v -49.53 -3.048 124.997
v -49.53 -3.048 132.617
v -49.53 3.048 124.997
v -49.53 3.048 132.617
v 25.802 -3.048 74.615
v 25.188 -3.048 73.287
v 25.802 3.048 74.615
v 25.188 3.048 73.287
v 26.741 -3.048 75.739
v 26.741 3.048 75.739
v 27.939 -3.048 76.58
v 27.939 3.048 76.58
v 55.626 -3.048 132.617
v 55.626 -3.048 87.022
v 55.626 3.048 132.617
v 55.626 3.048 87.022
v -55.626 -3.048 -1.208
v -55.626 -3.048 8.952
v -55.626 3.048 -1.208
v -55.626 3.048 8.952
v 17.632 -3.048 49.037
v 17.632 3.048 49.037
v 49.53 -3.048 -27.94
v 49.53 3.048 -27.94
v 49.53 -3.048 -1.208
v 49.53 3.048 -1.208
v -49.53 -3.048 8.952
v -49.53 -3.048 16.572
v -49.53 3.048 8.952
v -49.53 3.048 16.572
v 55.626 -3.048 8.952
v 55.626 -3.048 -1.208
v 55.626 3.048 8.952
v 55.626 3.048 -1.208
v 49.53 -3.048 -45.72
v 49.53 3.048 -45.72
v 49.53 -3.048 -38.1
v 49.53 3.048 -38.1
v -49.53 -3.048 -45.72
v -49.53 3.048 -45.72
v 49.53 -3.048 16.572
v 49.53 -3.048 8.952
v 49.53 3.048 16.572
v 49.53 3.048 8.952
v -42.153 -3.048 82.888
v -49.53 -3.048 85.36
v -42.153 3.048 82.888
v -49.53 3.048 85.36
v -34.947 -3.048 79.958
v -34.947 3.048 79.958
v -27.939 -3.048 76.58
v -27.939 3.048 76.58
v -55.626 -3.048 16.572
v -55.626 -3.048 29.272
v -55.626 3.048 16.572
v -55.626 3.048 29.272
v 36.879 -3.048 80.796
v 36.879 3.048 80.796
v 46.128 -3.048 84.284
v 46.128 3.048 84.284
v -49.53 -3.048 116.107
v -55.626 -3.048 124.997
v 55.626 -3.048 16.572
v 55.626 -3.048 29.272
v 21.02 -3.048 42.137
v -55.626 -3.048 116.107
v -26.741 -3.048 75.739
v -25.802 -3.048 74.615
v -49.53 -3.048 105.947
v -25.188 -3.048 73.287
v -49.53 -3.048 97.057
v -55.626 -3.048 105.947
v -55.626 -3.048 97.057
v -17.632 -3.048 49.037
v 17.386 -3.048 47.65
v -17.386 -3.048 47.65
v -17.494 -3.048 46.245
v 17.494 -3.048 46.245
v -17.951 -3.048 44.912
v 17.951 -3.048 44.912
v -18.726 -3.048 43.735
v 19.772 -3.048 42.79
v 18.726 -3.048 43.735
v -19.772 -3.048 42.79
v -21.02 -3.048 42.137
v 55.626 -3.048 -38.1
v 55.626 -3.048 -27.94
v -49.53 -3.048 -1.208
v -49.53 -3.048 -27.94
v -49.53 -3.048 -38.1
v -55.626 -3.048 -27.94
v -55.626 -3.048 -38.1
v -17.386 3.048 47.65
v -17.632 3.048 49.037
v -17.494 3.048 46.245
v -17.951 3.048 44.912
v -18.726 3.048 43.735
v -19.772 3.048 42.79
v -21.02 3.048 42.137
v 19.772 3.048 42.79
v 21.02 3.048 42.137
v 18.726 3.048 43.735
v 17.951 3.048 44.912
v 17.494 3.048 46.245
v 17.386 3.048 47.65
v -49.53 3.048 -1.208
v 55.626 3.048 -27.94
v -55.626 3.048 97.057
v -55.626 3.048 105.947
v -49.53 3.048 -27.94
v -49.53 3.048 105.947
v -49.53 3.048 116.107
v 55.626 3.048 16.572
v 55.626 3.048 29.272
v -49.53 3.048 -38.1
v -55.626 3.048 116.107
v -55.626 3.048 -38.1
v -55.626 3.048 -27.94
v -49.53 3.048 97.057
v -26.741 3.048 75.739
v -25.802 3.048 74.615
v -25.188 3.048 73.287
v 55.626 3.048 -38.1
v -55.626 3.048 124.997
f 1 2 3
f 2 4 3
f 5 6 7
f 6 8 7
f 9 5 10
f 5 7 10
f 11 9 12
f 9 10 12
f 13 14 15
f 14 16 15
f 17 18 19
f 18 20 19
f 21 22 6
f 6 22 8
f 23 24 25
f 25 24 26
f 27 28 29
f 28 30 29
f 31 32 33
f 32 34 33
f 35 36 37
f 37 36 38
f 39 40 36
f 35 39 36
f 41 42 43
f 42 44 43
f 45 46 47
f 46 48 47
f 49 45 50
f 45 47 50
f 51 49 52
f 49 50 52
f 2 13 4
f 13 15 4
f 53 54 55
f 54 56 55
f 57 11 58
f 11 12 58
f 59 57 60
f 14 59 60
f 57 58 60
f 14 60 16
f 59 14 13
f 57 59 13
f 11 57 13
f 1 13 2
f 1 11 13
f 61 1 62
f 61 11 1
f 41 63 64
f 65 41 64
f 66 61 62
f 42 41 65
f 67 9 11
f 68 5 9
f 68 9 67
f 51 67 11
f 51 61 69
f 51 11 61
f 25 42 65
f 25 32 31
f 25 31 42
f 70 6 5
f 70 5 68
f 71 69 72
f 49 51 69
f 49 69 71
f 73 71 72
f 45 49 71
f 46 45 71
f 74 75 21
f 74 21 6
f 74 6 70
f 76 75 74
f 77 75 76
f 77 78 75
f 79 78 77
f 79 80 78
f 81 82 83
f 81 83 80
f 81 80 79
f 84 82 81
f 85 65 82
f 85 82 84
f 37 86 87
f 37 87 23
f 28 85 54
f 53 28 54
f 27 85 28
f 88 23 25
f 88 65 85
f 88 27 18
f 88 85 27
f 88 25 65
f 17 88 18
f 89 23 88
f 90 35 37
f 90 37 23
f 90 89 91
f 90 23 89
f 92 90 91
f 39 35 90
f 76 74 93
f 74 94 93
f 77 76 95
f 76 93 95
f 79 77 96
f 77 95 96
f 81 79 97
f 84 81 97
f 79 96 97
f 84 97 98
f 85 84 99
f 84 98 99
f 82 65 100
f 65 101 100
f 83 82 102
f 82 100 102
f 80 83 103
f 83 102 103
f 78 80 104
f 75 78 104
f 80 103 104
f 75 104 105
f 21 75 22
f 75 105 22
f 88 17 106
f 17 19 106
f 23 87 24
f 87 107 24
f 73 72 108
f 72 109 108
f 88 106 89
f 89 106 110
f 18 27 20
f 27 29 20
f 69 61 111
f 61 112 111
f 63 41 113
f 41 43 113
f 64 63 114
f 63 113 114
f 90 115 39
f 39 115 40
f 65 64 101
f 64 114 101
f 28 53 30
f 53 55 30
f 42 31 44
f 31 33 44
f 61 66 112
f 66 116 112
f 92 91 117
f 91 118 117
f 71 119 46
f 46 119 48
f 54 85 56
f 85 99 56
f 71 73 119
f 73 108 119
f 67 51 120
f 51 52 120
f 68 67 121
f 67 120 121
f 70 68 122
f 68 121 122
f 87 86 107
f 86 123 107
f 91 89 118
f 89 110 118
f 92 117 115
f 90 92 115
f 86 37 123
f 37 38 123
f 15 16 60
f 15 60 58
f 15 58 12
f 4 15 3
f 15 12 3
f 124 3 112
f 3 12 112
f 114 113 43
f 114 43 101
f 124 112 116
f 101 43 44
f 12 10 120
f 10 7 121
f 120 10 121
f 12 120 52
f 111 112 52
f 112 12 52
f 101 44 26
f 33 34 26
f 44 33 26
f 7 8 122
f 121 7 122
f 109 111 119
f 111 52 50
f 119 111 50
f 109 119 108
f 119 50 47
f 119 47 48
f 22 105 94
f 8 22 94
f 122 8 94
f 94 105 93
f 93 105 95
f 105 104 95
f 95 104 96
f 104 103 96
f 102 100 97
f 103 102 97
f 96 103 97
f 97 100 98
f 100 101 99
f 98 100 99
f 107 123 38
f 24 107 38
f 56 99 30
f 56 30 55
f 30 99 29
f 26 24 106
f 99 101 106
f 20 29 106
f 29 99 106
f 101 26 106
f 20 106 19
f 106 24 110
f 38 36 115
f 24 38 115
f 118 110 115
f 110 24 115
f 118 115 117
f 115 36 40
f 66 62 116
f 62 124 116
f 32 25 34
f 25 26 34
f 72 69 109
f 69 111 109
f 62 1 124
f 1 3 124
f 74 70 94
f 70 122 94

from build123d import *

# Parameters (mm, degrees)
BOSS_EXTRUDE1_DEPTH = 3.048


with BuildPart() as part:
    # Sketch1 → Boss-Extrude1 (new, symmetric)
    with BuildSketch(Plane(origin=(0, 0, 0), x_dir=(1, 0, 0), z_dir=(0, 1, 0))):
        with BuildLine():
            Line((-49.53, 45.72), (49.53, 45.72))
            Line((49.53, 45.72), (49.53, 38.1))
            Line((49.53, 38.1), (55.626, 38.1))
            Line((55.626, 38.1), (55.626, 27.94))
            Line((55.626, 27.94), (49.53, 27.94))
            Line((49.53, 27.94), (49.53, 1.208143374))
            Line((49.53, 1.208143374), (55.626, 1.208143374))
            Line((55.626, 1.208143374), (55.626, -8.951856626))
            Line((55.626, -8.951856626), (49.53, -8.951856626))
            Line((49.53, -8.951856626), (49.53, -16.571856626))
            Line((49.53, -16.571856626), (55.626, -16.571856626))
            Line((55.626, -16.571856626), (55.626, -29.271856626))
            Line((55.626, -29.271856626), (21.019827136, -42.136821893))
            ThreePointArc((21.019827136, -42.136821893), (17.95098831, -44.911778638), (17.631953735, -49.036869377))
            Line((17.631953735, -49.036869377), (25.187729856, -73.287029113))
            ThreePointArc((25.187729856, -73.287029113), (26.234780075, -75.207903536), (27.939063878, -76.579577488))
            ThreePointArc((27.939063878, -76.579577488), (41.468907088, -82.632484358), (55.626, -87.022365809))
            Line((55.626, -87.022365809), (55.626, -132.617292876))
            Line((55.626, -132.617292876), (-49.53, -132.617292876))
            Line((-49.53, -132.617292876), (-49.53, -124.997292876))
            Line((-49.53, -124.997292876), (-55.626, -124.997292876))
            Line((-55.626, -124.997292876), (-55.626, -116.107292876))
            Line((-55.626, -116.107292876), (-49.53, -116.107292876))
            Line((-49.53, -116.107292876), (-49.53, -105.947292876))
            Line((-49.53, -105.947292876), (-55.626, -105.947292876))
            Line((-55.626, -105.947292876), (-55.626, -97.057292876))
            Line((-55.626, -97.057292876), (-49.53, -97.057292876))
            Line((-49.53, -97.057292876), (-49.53, -85.359826344))
            ThreePointArc((-49.53, -85.359826344), (-38.527111219, -81.479756652), (-27.939063878, -76.579577488))
            ThreePointArc((-27.939063878, -76.579577488), (-26.234780075, -75.207903536), (-25.187729856, -73.287029113))
            Line((-25.187729856, -73.287029113), (-17.631953735, -49.036869377))
            ThreePointArc((-17.631953735, -49.036869377), (-17.95098831, -44.911778638), (-21.019827136, -42.136821893))
            Line((-21.019827136, -42.136821893), (-55.626, -29.271856626))
            Line((-55.626, -29.271856626), (-55.626, -16.571856626))
            Line((-55.626, -16.571856626), (-49.53, -16.571856626))
            Line((-49.53, -16.571856626), (-49.53, -8.951856626))
            Line((-49.53, -8.951856626), (-55.626, -8.951856626))
            Line((-55.626, -8.951856626), (-55.626, 1.208143374))
            Line((-55.626, 1.208143374), (-49.53, 1.208143374))
            Line((-49.53, 1.208143374), (-49.53, 27.94))
            Line((-49.53, 27.94), (-55.626, 27.94))
            Line((-55.626, 27.94), (-55.626, 38.1))
            Line((-55.626, 38.1), (-49.53, 38.1))
            Line((-49.53, 38.1), (-49.53, 45.72))
        make_face()
    extrude(amount=BOSS_EXTRUDE1_DEPTH, both=True)


solid = part.part
